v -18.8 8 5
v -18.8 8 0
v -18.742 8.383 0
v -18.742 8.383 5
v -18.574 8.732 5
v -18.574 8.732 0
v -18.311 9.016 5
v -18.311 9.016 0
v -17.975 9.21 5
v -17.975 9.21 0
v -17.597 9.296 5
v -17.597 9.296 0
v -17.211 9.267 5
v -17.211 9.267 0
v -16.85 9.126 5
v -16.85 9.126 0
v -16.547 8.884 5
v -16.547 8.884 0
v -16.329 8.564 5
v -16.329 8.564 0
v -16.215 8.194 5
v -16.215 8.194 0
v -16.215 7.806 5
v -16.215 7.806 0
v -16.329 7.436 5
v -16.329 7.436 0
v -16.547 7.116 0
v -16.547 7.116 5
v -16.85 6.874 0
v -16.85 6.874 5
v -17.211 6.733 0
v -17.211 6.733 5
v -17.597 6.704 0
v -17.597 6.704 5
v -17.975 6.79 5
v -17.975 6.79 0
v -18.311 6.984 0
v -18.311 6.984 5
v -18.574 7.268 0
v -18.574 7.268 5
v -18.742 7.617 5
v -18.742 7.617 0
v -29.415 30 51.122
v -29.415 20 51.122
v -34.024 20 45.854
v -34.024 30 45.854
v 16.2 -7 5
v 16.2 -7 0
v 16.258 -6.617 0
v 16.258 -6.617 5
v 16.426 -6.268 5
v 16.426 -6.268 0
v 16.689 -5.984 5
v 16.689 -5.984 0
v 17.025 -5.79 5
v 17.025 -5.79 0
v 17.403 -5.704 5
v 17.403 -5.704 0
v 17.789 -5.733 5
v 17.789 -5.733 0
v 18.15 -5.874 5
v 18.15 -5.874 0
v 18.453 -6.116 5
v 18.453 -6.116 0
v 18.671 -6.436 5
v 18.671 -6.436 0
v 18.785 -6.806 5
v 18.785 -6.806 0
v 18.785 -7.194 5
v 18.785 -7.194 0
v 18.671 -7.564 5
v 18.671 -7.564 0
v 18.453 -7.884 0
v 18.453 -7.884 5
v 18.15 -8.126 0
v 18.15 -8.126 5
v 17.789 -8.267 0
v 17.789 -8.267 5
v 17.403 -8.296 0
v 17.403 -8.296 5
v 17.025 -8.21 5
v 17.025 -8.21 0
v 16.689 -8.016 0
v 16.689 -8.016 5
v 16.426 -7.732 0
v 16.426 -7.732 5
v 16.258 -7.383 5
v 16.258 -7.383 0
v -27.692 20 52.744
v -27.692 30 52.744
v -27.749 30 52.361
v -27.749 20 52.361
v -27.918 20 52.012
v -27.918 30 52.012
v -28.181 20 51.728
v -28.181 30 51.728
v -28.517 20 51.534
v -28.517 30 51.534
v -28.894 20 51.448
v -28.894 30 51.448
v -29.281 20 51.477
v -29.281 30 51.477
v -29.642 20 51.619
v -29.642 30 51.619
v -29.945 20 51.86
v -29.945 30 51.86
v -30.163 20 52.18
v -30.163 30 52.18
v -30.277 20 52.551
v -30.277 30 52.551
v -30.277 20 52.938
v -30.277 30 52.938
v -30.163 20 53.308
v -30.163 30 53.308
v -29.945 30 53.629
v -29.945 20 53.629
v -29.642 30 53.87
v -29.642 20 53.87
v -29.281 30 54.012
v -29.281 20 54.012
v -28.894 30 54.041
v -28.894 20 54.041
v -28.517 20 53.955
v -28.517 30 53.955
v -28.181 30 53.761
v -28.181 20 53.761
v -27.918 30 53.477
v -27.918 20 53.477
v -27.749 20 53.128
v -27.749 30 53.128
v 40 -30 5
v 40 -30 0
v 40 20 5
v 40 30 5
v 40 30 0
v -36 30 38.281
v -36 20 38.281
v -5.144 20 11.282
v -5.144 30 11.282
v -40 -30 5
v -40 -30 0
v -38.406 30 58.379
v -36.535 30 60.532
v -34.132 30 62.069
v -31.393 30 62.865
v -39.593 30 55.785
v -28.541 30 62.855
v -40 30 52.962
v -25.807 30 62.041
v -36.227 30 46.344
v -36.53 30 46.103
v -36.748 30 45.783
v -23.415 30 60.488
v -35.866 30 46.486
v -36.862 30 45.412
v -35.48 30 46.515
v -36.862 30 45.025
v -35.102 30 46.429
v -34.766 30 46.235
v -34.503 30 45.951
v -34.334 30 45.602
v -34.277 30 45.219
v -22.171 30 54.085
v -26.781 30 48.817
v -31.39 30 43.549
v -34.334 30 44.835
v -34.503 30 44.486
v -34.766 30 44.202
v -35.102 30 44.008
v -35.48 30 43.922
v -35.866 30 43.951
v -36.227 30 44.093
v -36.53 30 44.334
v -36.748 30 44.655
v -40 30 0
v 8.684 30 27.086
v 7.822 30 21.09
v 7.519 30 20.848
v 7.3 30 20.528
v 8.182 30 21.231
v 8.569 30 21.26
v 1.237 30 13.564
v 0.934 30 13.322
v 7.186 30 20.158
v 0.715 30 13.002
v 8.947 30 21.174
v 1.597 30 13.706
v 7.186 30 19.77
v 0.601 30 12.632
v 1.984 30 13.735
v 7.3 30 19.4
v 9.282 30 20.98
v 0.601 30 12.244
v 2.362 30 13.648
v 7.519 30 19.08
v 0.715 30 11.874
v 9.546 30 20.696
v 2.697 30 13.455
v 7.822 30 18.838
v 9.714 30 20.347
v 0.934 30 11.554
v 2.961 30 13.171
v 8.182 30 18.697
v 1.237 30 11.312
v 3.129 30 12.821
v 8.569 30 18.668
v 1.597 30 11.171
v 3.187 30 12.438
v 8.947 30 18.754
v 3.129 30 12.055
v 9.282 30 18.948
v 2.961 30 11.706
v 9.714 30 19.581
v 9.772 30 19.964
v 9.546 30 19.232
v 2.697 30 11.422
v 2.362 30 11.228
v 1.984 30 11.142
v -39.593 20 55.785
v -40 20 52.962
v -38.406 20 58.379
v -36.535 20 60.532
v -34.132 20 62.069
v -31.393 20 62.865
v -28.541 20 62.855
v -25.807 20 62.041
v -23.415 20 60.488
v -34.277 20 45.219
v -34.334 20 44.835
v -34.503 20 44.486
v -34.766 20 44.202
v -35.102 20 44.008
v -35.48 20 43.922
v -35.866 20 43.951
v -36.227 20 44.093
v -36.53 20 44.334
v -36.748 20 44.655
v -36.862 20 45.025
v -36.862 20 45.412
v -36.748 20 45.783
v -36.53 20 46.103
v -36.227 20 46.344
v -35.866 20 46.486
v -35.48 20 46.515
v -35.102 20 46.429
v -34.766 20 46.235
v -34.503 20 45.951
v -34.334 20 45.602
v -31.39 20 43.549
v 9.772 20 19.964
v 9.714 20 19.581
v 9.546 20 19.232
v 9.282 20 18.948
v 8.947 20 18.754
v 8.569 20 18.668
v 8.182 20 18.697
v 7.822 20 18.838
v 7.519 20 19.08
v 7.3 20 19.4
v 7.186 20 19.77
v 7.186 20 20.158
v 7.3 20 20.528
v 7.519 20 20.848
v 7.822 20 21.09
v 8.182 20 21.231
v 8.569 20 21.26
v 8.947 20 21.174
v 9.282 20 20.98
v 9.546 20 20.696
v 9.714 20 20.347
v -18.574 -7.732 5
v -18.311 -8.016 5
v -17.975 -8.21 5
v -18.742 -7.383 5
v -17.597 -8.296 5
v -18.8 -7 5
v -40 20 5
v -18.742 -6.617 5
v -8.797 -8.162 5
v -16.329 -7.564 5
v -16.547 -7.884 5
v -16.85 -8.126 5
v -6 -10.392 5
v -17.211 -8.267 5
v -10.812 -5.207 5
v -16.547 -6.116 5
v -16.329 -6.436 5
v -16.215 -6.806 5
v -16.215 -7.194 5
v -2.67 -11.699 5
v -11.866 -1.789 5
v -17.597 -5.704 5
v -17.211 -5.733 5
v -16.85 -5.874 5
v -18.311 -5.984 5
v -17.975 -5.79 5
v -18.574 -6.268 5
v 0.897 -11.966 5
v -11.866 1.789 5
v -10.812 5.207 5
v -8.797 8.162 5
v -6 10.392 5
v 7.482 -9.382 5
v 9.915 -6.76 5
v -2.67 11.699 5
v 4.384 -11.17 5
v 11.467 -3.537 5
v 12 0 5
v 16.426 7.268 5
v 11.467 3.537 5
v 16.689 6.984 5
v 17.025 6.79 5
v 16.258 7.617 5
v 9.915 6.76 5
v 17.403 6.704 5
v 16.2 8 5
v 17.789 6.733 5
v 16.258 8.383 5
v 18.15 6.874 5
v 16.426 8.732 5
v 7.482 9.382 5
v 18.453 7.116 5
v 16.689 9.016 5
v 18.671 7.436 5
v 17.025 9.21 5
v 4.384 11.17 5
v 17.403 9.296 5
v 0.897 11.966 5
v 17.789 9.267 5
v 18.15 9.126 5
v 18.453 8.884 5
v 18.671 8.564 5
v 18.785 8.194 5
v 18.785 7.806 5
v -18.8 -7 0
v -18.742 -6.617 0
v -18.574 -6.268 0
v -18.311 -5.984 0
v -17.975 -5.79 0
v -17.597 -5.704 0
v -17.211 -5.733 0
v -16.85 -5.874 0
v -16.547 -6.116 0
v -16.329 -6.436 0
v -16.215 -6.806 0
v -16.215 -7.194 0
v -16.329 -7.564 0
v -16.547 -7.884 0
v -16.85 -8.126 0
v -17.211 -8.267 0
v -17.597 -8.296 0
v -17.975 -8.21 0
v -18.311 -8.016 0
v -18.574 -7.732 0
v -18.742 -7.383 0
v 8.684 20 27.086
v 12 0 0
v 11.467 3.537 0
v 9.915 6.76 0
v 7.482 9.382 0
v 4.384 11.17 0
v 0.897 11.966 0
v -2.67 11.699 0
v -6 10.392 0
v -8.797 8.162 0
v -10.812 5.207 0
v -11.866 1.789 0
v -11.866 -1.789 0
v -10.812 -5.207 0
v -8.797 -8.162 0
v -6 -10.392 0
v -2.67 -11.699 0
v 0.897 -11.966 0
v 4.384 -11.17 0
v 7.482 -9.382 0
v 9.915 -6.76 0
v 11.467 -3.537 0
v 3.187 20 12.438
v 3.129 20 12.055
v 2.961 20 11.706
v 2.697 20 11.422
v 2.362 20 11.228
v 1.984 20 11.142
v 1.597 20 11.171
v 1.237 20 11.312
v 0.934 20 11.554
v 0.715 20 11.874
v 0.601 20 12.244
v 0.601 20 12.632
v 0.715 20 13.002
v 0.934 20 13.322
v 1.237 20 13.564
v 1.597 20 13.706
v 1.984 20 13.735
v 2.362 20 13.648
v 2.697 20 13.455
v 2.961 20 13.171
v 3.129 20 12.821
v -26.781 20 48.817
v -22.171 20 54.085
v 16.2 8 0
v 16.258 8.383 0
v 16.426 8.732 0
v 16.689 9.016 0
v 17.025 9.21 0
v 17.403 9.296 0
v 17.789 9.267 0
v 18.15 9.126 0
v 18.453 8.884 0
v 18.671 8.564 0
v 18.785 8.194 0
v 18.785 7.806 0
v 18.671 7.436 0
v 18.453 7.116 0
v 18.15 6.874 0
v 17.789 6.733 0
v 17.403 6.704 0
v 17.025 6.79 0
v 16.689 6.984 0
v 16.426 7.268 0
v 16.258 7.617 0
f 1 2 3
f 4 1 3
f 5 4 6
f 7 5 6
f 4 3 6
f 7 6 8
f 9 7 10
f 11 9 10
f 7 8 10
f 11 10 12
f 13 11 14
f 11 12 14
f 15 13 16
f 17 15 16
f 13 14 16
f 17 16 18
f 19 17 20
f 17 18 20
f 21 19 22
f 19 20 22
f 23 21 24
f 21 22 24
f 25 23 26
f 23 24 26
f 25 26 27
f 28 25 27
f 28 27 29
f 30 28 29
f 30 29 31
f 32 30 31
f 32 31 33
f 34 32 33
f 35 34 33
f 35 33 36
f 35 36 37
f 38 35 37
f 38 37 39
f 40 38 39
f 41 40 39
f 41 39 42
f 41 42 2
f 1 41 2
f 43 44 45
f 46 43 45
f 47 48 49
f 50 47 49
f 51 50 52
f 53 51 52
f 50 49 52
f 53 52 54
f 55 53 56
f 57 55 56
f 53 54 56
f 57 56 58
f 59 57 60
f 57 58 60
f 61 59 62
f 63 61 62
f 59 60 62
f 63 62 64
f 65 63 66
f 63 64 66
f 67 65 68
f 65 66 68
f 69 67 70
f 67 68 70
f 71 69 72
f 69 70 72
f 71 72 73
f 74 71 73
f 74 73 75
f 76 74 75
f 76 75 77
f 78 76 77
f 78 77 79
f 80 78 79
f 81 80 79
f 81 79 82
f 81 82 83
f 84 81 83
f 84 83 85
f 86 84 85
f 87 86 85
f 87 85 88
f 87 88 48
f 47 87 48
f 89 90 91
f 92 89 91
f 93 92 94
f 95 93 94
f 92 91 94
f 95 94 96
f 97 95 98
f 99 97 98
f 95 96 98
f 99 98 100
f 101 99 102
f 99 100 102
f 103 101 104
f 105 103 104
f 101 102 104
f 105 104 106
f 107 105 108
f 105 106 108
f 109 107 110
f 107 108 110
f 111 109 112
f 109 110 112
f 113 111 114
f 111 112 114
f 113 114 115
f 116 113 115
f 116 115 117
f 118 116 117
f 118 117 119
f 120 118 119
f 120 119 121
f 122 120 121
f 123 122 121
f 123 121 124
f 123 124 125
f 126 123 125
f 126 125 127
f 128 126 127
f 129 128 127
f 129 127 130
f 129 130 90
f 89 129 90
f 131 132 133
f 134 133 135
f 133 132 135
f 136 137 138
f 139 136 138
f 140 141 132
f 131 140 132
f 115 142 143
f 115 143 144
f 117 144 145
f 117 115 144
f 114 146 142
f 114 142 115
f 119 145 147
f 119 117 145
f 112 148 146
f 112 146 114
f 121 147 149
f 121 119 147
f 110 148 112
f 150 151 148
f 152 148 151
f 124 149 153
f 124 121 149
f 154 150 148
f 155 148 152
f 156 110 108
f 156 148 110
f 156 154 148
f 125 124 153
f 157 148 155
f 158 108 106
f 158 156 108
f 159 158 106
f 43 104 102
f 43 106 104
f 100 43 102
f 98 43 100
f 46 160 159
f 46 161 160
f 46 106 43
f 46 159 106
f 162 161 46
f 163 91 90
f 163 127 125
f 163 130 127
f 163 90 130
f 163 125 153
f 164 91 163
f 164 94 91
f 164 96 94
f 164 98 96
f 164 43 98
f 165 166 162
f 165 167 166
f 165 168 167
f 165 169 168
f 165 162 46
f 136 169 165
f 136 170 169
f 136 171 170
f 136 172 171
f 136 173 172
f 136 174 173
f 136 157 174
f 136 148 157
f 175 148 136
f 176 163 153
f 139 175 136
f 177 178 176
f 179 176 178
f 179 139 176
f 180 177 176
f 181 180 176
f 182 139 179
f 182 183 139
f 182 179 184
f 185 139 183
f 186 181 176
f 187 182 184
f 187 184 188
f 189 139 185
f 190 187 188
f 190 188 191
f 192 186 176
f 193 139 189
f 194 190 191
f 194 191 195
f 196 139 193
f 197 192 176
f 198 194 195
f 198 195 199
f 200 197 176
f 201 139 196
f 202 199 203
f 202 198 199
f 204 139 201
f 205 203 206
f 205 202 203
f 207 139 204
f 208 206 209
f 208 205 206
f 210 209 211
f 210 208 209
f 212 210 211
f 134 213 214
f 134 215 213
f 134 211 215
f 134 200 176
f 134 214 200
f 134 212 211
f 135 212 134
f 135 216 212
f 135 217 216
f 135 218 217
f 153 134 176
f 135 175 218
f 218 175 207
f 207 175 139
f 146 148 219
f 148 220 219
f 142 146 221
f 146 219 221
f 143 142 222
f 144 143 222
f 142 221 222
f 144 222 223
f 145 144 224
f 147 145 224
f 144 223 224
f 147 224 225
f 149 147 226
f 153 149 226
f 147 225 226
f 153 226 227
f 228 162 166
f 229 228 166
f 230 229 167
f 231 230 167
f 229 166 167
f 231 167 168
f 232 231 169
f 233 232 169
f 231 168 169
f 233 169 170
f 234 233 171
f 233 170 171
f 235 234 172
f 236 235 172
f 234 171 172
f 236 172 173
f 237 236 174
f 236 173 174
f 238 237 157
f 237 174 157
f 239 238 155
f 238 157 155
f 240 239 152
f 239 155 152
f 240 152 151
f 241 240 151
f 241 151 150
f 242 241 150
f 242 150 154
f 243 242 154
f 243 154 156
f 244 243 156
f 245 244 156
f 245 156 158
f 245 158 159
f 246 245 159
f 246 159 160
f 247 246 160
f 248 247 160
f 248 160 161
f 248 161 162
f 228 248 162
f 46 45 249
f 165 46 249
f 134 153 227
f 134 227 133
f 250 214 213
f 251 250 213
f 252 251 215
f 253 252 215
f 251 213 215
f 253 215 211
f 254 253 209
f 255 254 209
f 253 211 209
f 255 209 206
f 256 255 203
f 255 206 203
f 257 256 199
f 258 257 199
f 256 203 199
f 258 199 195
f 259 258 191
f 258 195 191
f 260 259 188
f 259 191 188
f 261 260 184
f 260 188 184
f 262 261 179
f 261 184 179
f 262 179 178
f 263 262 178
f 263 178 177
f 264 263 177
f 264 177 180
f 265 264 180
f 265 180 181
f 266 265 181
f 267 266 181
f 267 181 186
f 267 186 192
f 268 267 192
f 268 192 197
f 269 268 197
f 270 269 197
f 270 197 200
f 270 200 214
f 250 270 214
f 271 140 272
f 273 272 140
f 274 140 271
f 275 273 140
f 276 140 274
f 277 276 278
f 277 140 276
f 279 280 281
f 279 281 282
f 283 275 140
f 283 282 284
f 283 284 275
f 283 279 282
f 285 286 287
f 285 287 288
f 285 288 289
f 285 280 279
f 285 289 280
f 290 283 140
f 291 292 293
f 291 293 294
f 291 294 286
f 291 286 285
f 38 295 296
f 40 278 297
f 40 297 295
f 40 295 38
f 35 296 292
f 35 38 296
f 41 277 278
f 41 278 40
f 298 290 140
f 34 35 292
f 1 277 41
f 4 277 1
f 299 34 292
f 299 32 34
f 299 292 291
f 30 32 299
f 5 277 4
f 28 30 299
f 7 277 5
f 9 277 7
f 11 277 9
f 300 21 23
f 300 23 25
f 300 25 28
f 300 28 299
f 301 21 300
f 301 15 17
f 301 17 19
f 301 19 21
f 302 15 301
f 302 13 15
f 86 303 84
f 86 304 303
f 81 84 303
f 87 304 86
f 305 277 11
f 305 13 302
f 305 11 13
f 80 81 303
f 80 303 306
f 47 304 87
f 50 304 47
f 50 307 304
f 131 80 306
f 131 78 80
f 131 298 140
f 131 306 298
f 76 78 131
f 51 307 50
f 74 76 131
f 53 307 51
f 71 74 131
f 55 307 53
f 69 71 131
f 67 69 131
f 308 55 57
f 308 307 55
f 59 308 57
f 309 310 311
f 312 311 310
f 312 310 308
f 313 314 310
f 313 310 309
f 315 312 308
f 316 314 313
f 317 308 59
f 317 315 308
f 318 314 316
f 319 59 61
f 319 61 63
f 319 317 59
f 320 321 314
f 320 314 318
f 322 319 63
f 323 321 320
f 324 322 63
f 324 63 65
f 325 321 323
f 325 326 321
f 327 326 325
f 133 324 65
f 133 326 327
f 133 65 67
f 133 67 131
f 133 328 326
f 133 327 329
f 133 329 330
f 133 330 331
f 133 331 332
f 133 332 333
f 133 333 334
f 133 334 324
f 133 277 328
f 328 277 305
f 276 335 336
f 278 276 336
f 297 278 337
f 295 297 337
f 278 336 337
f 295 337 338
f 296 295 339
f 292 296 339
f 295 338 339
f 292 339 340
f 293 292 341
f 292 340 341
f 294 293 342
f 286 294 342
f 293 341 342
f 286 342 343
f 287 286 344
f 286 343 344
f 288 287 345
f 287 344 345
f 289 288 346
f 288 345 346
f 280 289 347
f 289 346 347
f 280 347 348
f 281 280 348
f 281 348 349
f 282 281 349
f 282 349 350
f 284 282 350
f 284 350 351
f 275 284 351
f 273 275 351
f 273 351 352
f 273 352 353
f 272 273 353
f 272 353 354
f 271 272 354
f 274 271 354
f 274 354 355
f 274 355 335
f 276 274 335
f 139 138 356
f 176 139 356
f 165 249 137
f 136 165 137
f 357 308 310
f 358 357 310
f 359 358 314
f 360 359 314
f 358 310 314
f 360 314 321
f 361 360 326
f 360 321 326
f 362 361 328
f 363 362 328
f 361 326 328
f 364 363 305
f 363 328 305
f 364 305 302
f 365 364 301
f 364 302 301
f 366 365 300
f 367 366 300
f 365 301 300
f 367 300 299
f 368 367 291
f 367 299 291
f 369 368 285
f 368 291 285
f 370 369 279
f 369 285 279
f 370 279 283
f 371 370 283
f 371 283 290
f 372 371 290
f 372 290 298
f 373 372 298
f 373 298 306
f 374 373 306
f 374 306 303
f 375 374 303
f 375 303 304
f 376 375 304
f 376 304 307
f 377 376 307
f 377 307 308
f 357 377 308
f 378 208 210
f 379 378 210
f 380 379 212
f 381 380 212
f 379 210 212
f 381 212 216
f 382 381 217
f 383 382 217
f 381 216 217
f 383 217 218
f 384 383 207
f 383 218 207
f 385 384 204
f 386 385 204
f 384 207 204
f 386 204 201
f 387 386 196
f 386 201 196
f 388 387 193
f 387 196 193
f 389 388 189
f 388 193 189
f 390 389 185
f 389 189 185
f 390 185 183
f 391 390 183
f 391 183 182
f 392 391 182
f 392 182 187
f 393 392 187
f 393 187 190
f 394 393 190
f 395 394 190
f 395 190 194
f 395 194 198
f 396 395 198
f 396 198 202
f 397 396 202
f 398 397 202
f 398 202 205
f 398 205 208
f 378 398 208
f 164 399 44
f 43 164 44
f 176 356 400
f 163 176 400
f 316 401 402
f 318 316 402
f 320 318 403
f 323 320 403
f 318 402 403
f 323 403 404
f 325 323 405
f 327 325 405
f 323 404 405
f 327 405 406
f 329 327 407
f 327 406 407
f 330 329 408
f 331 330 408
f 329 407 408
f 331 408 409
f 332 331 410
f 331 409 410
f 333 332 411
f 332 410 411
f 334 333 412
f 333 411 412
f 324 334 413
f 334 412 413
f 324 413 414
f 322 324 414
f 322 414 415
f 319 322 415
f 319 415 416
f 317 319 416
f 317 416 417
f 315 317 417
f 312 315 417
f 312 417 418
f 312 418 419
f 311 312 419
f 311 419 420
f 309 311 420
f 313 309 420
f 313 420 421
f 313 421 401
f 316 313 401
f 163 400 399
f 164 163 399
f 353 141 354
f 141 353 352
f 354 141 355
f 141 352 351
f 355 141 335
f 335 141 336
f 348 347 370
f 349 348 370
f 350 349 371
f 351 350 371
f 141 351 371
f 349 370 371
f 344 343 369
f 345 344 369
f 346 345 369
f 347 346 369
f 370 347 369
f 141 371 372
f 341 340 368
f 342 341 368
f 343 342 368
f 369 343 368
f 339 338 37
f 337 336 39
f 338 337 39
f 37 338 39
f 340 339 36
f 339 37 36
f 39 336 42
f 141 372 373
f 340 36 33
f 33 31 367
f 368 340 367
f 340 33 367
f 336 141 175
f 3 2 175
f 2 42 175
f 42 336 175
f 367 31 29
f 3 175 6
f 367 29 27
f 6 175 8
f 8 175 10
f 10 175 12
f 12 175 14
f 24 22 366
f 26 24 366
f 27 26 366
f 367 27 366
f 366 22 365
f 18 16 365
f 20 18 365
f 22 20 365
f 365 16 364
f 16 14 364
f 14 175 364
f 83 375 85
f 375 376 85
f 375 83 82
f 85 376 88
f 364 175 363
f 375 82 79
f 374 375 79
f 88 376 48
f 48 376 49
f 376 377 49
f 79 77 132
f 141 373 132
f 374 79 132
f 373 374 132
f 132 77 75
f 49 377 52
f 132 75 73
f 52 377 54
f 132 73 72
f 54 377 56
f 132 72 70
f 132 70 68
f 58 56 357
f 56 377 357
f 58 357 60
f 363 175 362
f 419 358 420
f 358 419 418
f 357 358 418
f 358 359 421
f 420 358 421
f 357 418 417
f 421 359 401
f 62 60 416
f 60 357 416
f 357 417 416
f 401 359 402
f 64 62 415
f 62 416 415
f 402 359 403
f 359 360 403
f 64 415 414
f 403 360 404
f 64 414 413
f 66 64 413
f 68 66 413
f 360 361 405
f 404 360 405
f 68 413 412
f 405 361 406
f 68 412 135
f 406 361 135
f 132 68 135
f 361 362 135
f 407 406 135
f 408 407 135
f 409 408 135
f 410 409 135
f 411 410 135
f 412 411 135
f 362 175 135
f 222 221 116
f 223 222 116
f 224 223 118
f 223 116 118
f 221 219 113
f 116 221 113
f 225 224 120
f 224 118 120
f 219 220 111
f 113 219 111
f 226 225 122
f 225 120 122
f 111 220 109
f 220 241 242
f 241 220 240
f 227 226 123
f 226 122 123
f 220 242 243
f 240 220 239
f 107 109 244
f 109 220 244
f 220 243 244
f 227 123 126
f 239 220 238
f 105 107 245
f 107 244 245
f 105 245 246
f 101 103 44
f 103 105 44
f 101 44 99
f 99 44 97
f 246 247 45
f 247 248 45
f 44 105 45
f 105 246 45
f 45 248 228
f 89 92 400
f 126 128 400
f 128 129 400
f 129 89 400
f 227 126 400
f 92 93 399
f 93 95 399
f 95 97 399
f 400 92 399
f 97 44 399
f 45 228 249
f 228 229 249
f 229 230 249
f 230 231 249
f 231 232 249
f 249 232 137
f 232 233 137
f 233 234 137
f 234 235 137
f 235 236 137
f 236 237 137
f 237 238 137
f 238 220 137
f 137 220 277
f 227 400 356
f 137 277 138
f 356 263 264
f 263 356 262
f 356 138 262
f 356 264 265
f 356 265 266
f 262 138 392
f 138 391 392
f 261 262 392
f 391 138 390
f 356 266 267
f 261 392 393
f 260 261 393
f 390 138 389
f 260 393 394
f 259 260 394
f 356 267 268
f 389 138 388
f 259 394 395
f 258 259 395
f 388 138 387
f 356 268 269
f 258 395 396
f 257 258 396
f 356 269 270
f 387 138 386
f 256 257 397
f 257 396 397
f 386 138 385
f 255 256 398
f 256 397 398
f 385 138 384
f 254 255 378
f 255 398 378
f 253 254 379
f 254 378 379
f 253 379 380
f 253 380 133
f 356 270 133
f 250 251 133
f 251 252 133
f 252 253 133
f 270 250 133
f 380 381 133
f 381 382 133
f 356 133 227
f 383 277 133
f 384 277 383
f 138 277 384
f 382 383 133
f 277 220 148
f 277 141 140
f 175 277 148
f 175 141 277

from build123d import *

# Parameters (mm, degrees)
SZKIC1_W                    = 80
SZKIC1_H                    = 60
DODANIE_WYCI_GNI_CIE1_DEPTH = 5
DODANIE_WYCI_GNI_CIE2_DEPTH = 10
OTW_R_POD_RUB_M22_D         = 2.6
OTW_R_POD_RUB_M22_DEPTH     = 5
WYTNIJ_WYCI_GNI_CIE2_REACH  = 12
OTW_R_POD_RUB_M21_D         = 2.6
OTW_R_POD_RUB_M21_DEPTH     = 10
ZAOKR_GLENIE5_R             = 10
OTW_R_POD_RUB_M201_D        = 24
OTW_R_POD_RUB_M201_DEPTH    = 5


with BuildPart() as part:
    # Szkic1 → Dodanie-wyciągnięcie1 (new body)
    with BuildSketch(Plane.XY):
        Rectangle(SZKIC1_W, SZKIC1_H)
    extrude(amount=DODANIE_WYCI_GNI_CIE1_DEPTH)

    # Szkic2 → Dodanie-wyciągnięcie2 (add)
    with BuildSketch(Plane(origin=(0, 30, 0), x_dir=(1, 0, 0), z_dir=(0, 1, 0))):
        Polygon((40, 0), (-40, 0), (-40, -75), (40, -5), align=None)
    extrude(amount=-DODANIE_WYCI_GNI_CIE2_DEPTH)

    # Otwór pod śrubę M22
    with Locations(Plane(origin=(-17.5, 8, 5), x_dir=(1, 0, 0), z_dir=(0, 0, 1))):
        with Locations((0, 0), (0, -15), (35, 0), (35, -15)):
            Hole(OTW_R_POD_RUB_M22_D / 2, depth=OTW_R_POD_RUB_M22_DEPTH)

    # Szkic17 → Wytnij-wyciągnięcie2 (cut, up to next)
    with BuildSketch(Plane.XZ.offset(-20), mode=Mode.PRIVATE) as wytnij_wyci_gni_cie2_sk1:
        Polygon((-36, 38.280794335), (-5.144355517, 11.282105413), (8.684241248, 27.086216001), (-22.171403235, 54.084904924), (-26.78093549, 48.816868061), (-29.414953921, 51.121634189), (-34.024486176, 45.853597326), (-31.390467745, 43.548831198), align=None)
    wytnij_wyci_gni_cie2_tool1 = extrude(wytnij_wyci_gni_cie2_sk1.sketch, amount=-WYTNIJ_WYCI_GNI_CIE2_REACH, mode=Mode.PRIVATE) & part.part
    add(wytnij_wyci_gni_cie2_tool1.solids().sort_by_distance((-14.121175, 20, 33.088889))[0], mode=Mode.SUBTRACT)

    # Otwór pod śrubę M21
    with Locations(Plane(origin=(0, 20, 0), x_dir=(-1, 0, 0), z_dir=(0, -1, 0))):
        with Locations((35.576675609, -45.21861074), (28.991629531, -52.744377687), (-8.471638332, -19.964018307), (-1.886592253, -12.43825136)):
            Hole(OTW_R_POD_RUB_M21_D / 2, depth=OTW_R_POD_RUB_M21_DEPTH)

    # Zaokrąglenie5
    zaokr_glenie5_edges = [part.edges().sort_by_distance(p)[0] for p in [
        (-40, 25, 75),
    ]]
    fillet(zaokr_glenie5_edges, radius=ZAOKR_GLENIE5_R)

    # Otwór pod śrubę M201
    with Locations(Plane(origin=(0, 0, 0), x_dir=(-1, 0, 0), z_dir=(0, 0, -1))):
        with Locations((0, 0)):
            Hole(OTW_R_POD_RUB_M201_D / 2, depth=OTW_R_POD_RUB_M201_DEPTH)


solid = part.part
